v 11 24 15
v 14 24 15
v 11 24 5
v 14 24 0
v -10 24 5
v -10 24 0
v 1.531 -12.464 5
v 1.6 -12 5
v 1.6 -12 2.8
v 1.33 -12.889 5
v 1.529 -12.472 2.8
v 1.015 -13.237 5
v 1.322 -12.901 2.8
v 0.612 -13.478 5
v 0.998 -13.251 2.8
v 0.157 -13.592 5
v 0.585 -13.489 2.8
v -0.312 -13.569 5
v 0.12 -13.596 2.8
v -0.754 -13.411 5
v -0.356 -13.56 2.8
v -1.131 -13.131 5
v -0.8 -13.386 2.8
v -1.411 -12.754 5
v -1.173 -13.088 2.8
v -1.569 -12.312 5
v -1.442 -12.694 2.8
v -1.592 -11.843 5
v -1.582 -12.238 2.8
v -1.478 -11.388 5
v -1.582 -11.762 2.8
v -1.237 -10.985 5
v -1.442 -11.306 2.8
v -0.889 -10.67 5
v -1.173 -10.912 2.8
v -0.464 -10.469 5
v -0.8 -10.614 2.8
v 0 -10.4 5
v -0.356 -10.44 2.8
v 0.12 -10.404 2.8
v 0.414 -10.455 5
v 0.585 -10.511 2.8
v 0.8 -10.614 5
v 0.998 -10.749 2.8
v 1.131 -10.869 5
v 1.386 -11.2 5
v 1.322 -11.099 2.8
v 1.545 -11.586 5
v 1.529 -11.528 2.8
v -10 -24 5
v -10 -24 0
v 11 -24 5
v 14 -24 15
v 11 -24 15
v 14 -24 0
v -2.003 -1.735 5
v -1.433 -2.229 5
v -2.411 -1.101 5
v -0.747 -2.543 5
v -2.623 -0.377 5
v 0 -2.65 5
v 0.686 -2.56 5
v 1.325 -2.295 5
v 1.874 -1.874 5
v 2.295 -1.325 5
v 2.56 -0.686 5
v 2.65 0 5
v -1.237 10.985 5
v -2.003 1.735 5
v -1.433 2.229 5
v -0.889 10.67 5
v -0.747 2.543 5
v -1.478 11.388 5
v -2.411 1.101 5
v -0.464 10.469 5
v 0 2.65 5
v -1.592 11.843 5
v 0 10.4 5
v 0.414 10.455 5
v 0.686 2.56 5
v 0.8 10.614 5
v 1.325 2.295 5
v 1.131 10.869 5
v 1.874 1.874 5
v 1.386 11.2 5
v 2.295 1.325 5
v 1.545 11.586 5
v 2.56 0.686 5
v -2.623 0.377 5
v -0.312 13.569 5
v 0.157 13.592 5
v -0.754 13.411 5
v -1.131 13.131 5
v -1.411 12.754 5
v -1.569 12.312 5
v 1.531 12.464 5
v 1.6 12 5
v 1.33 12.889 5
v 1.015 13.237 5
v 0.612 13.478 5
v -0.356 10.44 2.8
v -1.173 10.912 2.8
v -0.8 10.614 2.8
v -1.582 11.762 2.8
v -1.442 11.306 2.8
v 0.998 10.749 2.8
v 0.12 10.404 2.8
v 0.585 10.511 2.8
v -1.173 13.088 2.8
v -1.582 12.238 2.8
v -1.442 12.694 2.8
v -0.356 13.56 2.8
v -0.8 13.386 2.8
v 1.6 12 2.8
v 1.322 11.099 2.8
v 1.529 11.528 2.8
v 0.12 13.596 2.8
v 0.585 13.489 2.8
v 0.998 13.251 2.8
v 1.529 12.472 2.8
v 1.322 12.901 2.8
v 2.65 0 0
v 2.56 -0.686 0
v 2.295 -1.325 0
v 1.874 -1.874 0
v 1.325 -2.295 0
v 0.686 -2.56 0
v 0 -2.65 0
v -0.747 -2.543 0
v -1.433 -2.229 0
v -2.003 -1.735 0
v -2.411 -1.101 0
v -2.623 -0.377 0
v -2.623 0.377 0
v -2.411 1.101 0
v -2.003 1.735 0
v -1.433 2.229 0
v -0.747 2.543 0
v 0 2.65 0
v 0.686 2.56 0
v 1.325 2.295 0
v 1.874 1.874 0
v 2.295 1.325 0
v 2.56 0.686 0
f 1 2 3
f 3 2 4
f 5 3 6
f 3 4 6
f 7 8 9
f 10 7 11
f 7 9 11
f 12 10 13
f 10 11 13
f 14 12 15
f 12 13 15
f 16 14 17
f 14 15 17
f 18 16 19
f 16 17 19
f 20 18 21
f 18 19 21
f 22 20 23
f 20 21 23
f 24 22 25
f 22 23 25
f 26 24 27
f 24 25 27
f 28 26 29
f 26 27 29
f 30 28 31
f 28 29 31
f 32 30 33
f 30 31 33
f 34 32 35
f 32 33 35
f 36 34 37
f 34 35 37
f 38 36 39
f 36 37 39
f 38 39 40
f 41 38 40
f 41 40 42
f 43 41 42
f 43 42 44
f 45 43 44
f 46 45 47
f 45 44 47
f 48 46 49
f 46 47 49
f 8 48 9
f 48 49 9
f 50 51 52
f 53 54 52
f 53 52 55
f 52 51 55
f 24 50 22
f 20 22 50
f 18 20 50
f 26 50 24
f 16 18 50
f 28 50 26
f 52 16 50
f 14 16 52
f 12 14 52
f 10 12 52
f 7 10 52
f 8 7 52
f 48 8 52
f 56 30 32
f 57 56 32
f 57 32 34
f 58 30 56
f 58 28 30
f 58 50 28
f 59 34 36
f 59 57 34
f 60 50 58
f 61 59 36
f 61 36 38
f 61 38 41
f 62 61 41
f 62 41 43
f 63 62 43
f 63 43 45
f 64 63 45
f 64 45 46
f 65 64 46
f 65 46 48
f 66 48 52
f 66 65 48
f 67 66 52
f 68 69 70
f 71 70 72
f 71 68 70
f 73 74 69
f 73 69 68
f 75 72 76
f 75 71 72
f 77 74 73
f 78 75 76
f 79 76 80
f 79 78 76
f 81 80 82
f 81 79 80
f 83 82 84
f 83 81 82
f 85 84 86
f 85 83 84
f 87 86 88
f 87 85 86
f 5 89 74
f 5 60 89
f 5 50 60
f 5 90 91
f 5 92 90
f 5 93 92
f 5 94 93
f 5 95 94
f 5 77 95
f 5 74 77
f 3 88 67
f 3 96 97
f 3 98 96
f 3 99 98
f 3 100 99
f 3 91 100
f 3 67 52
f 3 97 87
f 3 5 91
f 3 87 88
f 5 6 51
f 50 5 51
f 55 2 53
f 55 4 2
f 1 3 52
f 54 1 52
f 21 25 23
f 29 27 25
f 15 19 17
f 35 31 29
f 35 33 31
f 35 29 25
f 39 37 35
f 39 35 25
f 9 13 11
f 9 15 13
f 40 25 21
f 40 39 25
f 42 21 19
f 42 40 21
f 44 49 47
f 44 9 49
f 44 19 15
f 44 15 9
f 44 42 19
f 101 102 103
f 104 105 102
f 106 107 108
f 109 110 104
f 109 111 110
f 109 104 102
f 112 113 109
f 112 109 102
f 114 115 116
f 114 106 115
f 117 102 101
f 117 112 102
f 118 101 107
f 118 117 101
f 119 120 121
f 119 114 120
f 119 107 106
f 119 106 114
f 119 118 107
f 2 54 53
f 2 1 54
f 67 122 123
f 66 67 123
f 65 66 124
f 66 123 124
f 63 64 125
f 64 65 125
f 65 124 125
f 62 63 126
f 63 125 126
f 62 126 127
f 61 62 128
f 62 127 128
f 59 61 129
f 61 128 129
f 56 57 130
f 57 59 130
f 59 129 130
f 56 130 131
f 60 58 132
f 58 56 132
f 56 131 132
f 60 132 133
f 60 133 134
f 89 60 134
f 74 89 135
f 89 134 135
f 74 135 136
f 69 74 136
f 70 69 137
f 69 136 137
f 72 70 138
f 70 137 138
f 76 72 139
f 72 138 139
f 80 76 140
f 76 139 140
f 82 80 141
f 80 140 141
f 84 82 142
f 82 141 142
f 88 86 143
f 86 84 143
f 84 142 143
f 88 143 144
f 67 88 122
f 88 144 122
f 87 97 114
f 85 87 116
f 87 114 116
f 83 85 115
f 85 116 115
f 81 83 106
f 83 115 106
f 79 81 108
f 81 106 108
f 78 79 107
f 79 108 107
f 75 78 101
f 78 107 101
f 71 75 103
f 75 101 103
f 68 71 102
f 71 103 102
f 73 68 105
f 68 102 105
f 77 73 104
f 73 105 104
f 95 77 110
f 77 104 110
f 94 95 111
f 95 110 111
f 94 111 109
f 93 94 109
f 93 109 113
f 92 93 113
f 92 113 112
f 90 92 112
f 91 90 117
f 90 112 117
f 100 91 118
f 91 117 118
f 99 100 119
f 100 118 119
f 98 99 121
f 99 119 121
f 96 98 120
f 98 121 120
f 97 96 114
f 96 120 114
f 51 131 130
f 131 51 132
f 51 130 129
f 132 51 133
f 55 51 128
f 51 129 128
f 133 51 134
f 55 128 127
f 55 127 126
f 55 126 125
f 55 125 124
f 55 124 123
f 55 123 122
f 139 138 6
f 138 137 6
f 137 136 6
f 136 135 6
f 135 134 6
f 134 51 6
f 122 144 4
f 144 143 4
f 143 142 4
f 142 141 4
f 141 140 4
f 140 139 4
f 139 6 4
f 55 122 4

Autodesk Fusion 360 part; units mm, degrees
sketch "스케치1" plane through (0, 0, 0) normal (0, 0, 1) x (1, 0, 0)
  line L0 (10, 24) -> (-10, 24)
  line L1 (-10, 24) -> (-10, -24)
  line L2 (-10, -24) -> (10, -24)
  line L3 (10, -24) -> (10, 24)
  line L4 (10, 24) -> (-10, -24) construction
  line L5 (-10, 24) -> (10, -24) construction
  circle A0 centre (0, 0) radius 2.65
  line L6 (0, 0) -> (0, 12)
  circle A1 centre (0, 12) radius 1.6
  line L7 (0, 0) -> (0, -12)
  circle A2 centre (0, -12) radius 1.6
  line L8 (10, 24) -> (11, 24)
  line L9 (11, 24) -> (11, -24)
  line L10 (11, -24) -> (10, -24)
  line L11 (10, -24) -> (10, 24)
  line L12 (11, 24) -> (14, 24)
  line L13 (14, 24) -> (14, -24)
  line L14 (14, -24) -> (11, -24)
  line L15 (11, -24) -> (11, 24)
  line L16 (10, -6) -> (14, -6)
  dimension "d1" = 20
  dimension "d2" = 48
  dimension "d3" = 5.3
  dimension "d4" = 12
  dimension "d5" = 3.2
  dimension "d6" = 12
  dimension "d7" = 3.2
  dimension "d12" = 3
extrude "돌출1" add sketch "스케치1" along normal blind 5 contours L0 L1 L2 L3 L11 | L3 L8 L9 L11 L15 L16 | L3 L9 L10 L11 L15 L16
extrude "돌출2" add sketch "스케치1" along normal blind 2.8 contours A2 | A1
extrude "돌출3" add sketch "스케치1" along normal blind 15 contours L9 L12 L13 L15 L16 | L9 L13 L14 L15 L16
